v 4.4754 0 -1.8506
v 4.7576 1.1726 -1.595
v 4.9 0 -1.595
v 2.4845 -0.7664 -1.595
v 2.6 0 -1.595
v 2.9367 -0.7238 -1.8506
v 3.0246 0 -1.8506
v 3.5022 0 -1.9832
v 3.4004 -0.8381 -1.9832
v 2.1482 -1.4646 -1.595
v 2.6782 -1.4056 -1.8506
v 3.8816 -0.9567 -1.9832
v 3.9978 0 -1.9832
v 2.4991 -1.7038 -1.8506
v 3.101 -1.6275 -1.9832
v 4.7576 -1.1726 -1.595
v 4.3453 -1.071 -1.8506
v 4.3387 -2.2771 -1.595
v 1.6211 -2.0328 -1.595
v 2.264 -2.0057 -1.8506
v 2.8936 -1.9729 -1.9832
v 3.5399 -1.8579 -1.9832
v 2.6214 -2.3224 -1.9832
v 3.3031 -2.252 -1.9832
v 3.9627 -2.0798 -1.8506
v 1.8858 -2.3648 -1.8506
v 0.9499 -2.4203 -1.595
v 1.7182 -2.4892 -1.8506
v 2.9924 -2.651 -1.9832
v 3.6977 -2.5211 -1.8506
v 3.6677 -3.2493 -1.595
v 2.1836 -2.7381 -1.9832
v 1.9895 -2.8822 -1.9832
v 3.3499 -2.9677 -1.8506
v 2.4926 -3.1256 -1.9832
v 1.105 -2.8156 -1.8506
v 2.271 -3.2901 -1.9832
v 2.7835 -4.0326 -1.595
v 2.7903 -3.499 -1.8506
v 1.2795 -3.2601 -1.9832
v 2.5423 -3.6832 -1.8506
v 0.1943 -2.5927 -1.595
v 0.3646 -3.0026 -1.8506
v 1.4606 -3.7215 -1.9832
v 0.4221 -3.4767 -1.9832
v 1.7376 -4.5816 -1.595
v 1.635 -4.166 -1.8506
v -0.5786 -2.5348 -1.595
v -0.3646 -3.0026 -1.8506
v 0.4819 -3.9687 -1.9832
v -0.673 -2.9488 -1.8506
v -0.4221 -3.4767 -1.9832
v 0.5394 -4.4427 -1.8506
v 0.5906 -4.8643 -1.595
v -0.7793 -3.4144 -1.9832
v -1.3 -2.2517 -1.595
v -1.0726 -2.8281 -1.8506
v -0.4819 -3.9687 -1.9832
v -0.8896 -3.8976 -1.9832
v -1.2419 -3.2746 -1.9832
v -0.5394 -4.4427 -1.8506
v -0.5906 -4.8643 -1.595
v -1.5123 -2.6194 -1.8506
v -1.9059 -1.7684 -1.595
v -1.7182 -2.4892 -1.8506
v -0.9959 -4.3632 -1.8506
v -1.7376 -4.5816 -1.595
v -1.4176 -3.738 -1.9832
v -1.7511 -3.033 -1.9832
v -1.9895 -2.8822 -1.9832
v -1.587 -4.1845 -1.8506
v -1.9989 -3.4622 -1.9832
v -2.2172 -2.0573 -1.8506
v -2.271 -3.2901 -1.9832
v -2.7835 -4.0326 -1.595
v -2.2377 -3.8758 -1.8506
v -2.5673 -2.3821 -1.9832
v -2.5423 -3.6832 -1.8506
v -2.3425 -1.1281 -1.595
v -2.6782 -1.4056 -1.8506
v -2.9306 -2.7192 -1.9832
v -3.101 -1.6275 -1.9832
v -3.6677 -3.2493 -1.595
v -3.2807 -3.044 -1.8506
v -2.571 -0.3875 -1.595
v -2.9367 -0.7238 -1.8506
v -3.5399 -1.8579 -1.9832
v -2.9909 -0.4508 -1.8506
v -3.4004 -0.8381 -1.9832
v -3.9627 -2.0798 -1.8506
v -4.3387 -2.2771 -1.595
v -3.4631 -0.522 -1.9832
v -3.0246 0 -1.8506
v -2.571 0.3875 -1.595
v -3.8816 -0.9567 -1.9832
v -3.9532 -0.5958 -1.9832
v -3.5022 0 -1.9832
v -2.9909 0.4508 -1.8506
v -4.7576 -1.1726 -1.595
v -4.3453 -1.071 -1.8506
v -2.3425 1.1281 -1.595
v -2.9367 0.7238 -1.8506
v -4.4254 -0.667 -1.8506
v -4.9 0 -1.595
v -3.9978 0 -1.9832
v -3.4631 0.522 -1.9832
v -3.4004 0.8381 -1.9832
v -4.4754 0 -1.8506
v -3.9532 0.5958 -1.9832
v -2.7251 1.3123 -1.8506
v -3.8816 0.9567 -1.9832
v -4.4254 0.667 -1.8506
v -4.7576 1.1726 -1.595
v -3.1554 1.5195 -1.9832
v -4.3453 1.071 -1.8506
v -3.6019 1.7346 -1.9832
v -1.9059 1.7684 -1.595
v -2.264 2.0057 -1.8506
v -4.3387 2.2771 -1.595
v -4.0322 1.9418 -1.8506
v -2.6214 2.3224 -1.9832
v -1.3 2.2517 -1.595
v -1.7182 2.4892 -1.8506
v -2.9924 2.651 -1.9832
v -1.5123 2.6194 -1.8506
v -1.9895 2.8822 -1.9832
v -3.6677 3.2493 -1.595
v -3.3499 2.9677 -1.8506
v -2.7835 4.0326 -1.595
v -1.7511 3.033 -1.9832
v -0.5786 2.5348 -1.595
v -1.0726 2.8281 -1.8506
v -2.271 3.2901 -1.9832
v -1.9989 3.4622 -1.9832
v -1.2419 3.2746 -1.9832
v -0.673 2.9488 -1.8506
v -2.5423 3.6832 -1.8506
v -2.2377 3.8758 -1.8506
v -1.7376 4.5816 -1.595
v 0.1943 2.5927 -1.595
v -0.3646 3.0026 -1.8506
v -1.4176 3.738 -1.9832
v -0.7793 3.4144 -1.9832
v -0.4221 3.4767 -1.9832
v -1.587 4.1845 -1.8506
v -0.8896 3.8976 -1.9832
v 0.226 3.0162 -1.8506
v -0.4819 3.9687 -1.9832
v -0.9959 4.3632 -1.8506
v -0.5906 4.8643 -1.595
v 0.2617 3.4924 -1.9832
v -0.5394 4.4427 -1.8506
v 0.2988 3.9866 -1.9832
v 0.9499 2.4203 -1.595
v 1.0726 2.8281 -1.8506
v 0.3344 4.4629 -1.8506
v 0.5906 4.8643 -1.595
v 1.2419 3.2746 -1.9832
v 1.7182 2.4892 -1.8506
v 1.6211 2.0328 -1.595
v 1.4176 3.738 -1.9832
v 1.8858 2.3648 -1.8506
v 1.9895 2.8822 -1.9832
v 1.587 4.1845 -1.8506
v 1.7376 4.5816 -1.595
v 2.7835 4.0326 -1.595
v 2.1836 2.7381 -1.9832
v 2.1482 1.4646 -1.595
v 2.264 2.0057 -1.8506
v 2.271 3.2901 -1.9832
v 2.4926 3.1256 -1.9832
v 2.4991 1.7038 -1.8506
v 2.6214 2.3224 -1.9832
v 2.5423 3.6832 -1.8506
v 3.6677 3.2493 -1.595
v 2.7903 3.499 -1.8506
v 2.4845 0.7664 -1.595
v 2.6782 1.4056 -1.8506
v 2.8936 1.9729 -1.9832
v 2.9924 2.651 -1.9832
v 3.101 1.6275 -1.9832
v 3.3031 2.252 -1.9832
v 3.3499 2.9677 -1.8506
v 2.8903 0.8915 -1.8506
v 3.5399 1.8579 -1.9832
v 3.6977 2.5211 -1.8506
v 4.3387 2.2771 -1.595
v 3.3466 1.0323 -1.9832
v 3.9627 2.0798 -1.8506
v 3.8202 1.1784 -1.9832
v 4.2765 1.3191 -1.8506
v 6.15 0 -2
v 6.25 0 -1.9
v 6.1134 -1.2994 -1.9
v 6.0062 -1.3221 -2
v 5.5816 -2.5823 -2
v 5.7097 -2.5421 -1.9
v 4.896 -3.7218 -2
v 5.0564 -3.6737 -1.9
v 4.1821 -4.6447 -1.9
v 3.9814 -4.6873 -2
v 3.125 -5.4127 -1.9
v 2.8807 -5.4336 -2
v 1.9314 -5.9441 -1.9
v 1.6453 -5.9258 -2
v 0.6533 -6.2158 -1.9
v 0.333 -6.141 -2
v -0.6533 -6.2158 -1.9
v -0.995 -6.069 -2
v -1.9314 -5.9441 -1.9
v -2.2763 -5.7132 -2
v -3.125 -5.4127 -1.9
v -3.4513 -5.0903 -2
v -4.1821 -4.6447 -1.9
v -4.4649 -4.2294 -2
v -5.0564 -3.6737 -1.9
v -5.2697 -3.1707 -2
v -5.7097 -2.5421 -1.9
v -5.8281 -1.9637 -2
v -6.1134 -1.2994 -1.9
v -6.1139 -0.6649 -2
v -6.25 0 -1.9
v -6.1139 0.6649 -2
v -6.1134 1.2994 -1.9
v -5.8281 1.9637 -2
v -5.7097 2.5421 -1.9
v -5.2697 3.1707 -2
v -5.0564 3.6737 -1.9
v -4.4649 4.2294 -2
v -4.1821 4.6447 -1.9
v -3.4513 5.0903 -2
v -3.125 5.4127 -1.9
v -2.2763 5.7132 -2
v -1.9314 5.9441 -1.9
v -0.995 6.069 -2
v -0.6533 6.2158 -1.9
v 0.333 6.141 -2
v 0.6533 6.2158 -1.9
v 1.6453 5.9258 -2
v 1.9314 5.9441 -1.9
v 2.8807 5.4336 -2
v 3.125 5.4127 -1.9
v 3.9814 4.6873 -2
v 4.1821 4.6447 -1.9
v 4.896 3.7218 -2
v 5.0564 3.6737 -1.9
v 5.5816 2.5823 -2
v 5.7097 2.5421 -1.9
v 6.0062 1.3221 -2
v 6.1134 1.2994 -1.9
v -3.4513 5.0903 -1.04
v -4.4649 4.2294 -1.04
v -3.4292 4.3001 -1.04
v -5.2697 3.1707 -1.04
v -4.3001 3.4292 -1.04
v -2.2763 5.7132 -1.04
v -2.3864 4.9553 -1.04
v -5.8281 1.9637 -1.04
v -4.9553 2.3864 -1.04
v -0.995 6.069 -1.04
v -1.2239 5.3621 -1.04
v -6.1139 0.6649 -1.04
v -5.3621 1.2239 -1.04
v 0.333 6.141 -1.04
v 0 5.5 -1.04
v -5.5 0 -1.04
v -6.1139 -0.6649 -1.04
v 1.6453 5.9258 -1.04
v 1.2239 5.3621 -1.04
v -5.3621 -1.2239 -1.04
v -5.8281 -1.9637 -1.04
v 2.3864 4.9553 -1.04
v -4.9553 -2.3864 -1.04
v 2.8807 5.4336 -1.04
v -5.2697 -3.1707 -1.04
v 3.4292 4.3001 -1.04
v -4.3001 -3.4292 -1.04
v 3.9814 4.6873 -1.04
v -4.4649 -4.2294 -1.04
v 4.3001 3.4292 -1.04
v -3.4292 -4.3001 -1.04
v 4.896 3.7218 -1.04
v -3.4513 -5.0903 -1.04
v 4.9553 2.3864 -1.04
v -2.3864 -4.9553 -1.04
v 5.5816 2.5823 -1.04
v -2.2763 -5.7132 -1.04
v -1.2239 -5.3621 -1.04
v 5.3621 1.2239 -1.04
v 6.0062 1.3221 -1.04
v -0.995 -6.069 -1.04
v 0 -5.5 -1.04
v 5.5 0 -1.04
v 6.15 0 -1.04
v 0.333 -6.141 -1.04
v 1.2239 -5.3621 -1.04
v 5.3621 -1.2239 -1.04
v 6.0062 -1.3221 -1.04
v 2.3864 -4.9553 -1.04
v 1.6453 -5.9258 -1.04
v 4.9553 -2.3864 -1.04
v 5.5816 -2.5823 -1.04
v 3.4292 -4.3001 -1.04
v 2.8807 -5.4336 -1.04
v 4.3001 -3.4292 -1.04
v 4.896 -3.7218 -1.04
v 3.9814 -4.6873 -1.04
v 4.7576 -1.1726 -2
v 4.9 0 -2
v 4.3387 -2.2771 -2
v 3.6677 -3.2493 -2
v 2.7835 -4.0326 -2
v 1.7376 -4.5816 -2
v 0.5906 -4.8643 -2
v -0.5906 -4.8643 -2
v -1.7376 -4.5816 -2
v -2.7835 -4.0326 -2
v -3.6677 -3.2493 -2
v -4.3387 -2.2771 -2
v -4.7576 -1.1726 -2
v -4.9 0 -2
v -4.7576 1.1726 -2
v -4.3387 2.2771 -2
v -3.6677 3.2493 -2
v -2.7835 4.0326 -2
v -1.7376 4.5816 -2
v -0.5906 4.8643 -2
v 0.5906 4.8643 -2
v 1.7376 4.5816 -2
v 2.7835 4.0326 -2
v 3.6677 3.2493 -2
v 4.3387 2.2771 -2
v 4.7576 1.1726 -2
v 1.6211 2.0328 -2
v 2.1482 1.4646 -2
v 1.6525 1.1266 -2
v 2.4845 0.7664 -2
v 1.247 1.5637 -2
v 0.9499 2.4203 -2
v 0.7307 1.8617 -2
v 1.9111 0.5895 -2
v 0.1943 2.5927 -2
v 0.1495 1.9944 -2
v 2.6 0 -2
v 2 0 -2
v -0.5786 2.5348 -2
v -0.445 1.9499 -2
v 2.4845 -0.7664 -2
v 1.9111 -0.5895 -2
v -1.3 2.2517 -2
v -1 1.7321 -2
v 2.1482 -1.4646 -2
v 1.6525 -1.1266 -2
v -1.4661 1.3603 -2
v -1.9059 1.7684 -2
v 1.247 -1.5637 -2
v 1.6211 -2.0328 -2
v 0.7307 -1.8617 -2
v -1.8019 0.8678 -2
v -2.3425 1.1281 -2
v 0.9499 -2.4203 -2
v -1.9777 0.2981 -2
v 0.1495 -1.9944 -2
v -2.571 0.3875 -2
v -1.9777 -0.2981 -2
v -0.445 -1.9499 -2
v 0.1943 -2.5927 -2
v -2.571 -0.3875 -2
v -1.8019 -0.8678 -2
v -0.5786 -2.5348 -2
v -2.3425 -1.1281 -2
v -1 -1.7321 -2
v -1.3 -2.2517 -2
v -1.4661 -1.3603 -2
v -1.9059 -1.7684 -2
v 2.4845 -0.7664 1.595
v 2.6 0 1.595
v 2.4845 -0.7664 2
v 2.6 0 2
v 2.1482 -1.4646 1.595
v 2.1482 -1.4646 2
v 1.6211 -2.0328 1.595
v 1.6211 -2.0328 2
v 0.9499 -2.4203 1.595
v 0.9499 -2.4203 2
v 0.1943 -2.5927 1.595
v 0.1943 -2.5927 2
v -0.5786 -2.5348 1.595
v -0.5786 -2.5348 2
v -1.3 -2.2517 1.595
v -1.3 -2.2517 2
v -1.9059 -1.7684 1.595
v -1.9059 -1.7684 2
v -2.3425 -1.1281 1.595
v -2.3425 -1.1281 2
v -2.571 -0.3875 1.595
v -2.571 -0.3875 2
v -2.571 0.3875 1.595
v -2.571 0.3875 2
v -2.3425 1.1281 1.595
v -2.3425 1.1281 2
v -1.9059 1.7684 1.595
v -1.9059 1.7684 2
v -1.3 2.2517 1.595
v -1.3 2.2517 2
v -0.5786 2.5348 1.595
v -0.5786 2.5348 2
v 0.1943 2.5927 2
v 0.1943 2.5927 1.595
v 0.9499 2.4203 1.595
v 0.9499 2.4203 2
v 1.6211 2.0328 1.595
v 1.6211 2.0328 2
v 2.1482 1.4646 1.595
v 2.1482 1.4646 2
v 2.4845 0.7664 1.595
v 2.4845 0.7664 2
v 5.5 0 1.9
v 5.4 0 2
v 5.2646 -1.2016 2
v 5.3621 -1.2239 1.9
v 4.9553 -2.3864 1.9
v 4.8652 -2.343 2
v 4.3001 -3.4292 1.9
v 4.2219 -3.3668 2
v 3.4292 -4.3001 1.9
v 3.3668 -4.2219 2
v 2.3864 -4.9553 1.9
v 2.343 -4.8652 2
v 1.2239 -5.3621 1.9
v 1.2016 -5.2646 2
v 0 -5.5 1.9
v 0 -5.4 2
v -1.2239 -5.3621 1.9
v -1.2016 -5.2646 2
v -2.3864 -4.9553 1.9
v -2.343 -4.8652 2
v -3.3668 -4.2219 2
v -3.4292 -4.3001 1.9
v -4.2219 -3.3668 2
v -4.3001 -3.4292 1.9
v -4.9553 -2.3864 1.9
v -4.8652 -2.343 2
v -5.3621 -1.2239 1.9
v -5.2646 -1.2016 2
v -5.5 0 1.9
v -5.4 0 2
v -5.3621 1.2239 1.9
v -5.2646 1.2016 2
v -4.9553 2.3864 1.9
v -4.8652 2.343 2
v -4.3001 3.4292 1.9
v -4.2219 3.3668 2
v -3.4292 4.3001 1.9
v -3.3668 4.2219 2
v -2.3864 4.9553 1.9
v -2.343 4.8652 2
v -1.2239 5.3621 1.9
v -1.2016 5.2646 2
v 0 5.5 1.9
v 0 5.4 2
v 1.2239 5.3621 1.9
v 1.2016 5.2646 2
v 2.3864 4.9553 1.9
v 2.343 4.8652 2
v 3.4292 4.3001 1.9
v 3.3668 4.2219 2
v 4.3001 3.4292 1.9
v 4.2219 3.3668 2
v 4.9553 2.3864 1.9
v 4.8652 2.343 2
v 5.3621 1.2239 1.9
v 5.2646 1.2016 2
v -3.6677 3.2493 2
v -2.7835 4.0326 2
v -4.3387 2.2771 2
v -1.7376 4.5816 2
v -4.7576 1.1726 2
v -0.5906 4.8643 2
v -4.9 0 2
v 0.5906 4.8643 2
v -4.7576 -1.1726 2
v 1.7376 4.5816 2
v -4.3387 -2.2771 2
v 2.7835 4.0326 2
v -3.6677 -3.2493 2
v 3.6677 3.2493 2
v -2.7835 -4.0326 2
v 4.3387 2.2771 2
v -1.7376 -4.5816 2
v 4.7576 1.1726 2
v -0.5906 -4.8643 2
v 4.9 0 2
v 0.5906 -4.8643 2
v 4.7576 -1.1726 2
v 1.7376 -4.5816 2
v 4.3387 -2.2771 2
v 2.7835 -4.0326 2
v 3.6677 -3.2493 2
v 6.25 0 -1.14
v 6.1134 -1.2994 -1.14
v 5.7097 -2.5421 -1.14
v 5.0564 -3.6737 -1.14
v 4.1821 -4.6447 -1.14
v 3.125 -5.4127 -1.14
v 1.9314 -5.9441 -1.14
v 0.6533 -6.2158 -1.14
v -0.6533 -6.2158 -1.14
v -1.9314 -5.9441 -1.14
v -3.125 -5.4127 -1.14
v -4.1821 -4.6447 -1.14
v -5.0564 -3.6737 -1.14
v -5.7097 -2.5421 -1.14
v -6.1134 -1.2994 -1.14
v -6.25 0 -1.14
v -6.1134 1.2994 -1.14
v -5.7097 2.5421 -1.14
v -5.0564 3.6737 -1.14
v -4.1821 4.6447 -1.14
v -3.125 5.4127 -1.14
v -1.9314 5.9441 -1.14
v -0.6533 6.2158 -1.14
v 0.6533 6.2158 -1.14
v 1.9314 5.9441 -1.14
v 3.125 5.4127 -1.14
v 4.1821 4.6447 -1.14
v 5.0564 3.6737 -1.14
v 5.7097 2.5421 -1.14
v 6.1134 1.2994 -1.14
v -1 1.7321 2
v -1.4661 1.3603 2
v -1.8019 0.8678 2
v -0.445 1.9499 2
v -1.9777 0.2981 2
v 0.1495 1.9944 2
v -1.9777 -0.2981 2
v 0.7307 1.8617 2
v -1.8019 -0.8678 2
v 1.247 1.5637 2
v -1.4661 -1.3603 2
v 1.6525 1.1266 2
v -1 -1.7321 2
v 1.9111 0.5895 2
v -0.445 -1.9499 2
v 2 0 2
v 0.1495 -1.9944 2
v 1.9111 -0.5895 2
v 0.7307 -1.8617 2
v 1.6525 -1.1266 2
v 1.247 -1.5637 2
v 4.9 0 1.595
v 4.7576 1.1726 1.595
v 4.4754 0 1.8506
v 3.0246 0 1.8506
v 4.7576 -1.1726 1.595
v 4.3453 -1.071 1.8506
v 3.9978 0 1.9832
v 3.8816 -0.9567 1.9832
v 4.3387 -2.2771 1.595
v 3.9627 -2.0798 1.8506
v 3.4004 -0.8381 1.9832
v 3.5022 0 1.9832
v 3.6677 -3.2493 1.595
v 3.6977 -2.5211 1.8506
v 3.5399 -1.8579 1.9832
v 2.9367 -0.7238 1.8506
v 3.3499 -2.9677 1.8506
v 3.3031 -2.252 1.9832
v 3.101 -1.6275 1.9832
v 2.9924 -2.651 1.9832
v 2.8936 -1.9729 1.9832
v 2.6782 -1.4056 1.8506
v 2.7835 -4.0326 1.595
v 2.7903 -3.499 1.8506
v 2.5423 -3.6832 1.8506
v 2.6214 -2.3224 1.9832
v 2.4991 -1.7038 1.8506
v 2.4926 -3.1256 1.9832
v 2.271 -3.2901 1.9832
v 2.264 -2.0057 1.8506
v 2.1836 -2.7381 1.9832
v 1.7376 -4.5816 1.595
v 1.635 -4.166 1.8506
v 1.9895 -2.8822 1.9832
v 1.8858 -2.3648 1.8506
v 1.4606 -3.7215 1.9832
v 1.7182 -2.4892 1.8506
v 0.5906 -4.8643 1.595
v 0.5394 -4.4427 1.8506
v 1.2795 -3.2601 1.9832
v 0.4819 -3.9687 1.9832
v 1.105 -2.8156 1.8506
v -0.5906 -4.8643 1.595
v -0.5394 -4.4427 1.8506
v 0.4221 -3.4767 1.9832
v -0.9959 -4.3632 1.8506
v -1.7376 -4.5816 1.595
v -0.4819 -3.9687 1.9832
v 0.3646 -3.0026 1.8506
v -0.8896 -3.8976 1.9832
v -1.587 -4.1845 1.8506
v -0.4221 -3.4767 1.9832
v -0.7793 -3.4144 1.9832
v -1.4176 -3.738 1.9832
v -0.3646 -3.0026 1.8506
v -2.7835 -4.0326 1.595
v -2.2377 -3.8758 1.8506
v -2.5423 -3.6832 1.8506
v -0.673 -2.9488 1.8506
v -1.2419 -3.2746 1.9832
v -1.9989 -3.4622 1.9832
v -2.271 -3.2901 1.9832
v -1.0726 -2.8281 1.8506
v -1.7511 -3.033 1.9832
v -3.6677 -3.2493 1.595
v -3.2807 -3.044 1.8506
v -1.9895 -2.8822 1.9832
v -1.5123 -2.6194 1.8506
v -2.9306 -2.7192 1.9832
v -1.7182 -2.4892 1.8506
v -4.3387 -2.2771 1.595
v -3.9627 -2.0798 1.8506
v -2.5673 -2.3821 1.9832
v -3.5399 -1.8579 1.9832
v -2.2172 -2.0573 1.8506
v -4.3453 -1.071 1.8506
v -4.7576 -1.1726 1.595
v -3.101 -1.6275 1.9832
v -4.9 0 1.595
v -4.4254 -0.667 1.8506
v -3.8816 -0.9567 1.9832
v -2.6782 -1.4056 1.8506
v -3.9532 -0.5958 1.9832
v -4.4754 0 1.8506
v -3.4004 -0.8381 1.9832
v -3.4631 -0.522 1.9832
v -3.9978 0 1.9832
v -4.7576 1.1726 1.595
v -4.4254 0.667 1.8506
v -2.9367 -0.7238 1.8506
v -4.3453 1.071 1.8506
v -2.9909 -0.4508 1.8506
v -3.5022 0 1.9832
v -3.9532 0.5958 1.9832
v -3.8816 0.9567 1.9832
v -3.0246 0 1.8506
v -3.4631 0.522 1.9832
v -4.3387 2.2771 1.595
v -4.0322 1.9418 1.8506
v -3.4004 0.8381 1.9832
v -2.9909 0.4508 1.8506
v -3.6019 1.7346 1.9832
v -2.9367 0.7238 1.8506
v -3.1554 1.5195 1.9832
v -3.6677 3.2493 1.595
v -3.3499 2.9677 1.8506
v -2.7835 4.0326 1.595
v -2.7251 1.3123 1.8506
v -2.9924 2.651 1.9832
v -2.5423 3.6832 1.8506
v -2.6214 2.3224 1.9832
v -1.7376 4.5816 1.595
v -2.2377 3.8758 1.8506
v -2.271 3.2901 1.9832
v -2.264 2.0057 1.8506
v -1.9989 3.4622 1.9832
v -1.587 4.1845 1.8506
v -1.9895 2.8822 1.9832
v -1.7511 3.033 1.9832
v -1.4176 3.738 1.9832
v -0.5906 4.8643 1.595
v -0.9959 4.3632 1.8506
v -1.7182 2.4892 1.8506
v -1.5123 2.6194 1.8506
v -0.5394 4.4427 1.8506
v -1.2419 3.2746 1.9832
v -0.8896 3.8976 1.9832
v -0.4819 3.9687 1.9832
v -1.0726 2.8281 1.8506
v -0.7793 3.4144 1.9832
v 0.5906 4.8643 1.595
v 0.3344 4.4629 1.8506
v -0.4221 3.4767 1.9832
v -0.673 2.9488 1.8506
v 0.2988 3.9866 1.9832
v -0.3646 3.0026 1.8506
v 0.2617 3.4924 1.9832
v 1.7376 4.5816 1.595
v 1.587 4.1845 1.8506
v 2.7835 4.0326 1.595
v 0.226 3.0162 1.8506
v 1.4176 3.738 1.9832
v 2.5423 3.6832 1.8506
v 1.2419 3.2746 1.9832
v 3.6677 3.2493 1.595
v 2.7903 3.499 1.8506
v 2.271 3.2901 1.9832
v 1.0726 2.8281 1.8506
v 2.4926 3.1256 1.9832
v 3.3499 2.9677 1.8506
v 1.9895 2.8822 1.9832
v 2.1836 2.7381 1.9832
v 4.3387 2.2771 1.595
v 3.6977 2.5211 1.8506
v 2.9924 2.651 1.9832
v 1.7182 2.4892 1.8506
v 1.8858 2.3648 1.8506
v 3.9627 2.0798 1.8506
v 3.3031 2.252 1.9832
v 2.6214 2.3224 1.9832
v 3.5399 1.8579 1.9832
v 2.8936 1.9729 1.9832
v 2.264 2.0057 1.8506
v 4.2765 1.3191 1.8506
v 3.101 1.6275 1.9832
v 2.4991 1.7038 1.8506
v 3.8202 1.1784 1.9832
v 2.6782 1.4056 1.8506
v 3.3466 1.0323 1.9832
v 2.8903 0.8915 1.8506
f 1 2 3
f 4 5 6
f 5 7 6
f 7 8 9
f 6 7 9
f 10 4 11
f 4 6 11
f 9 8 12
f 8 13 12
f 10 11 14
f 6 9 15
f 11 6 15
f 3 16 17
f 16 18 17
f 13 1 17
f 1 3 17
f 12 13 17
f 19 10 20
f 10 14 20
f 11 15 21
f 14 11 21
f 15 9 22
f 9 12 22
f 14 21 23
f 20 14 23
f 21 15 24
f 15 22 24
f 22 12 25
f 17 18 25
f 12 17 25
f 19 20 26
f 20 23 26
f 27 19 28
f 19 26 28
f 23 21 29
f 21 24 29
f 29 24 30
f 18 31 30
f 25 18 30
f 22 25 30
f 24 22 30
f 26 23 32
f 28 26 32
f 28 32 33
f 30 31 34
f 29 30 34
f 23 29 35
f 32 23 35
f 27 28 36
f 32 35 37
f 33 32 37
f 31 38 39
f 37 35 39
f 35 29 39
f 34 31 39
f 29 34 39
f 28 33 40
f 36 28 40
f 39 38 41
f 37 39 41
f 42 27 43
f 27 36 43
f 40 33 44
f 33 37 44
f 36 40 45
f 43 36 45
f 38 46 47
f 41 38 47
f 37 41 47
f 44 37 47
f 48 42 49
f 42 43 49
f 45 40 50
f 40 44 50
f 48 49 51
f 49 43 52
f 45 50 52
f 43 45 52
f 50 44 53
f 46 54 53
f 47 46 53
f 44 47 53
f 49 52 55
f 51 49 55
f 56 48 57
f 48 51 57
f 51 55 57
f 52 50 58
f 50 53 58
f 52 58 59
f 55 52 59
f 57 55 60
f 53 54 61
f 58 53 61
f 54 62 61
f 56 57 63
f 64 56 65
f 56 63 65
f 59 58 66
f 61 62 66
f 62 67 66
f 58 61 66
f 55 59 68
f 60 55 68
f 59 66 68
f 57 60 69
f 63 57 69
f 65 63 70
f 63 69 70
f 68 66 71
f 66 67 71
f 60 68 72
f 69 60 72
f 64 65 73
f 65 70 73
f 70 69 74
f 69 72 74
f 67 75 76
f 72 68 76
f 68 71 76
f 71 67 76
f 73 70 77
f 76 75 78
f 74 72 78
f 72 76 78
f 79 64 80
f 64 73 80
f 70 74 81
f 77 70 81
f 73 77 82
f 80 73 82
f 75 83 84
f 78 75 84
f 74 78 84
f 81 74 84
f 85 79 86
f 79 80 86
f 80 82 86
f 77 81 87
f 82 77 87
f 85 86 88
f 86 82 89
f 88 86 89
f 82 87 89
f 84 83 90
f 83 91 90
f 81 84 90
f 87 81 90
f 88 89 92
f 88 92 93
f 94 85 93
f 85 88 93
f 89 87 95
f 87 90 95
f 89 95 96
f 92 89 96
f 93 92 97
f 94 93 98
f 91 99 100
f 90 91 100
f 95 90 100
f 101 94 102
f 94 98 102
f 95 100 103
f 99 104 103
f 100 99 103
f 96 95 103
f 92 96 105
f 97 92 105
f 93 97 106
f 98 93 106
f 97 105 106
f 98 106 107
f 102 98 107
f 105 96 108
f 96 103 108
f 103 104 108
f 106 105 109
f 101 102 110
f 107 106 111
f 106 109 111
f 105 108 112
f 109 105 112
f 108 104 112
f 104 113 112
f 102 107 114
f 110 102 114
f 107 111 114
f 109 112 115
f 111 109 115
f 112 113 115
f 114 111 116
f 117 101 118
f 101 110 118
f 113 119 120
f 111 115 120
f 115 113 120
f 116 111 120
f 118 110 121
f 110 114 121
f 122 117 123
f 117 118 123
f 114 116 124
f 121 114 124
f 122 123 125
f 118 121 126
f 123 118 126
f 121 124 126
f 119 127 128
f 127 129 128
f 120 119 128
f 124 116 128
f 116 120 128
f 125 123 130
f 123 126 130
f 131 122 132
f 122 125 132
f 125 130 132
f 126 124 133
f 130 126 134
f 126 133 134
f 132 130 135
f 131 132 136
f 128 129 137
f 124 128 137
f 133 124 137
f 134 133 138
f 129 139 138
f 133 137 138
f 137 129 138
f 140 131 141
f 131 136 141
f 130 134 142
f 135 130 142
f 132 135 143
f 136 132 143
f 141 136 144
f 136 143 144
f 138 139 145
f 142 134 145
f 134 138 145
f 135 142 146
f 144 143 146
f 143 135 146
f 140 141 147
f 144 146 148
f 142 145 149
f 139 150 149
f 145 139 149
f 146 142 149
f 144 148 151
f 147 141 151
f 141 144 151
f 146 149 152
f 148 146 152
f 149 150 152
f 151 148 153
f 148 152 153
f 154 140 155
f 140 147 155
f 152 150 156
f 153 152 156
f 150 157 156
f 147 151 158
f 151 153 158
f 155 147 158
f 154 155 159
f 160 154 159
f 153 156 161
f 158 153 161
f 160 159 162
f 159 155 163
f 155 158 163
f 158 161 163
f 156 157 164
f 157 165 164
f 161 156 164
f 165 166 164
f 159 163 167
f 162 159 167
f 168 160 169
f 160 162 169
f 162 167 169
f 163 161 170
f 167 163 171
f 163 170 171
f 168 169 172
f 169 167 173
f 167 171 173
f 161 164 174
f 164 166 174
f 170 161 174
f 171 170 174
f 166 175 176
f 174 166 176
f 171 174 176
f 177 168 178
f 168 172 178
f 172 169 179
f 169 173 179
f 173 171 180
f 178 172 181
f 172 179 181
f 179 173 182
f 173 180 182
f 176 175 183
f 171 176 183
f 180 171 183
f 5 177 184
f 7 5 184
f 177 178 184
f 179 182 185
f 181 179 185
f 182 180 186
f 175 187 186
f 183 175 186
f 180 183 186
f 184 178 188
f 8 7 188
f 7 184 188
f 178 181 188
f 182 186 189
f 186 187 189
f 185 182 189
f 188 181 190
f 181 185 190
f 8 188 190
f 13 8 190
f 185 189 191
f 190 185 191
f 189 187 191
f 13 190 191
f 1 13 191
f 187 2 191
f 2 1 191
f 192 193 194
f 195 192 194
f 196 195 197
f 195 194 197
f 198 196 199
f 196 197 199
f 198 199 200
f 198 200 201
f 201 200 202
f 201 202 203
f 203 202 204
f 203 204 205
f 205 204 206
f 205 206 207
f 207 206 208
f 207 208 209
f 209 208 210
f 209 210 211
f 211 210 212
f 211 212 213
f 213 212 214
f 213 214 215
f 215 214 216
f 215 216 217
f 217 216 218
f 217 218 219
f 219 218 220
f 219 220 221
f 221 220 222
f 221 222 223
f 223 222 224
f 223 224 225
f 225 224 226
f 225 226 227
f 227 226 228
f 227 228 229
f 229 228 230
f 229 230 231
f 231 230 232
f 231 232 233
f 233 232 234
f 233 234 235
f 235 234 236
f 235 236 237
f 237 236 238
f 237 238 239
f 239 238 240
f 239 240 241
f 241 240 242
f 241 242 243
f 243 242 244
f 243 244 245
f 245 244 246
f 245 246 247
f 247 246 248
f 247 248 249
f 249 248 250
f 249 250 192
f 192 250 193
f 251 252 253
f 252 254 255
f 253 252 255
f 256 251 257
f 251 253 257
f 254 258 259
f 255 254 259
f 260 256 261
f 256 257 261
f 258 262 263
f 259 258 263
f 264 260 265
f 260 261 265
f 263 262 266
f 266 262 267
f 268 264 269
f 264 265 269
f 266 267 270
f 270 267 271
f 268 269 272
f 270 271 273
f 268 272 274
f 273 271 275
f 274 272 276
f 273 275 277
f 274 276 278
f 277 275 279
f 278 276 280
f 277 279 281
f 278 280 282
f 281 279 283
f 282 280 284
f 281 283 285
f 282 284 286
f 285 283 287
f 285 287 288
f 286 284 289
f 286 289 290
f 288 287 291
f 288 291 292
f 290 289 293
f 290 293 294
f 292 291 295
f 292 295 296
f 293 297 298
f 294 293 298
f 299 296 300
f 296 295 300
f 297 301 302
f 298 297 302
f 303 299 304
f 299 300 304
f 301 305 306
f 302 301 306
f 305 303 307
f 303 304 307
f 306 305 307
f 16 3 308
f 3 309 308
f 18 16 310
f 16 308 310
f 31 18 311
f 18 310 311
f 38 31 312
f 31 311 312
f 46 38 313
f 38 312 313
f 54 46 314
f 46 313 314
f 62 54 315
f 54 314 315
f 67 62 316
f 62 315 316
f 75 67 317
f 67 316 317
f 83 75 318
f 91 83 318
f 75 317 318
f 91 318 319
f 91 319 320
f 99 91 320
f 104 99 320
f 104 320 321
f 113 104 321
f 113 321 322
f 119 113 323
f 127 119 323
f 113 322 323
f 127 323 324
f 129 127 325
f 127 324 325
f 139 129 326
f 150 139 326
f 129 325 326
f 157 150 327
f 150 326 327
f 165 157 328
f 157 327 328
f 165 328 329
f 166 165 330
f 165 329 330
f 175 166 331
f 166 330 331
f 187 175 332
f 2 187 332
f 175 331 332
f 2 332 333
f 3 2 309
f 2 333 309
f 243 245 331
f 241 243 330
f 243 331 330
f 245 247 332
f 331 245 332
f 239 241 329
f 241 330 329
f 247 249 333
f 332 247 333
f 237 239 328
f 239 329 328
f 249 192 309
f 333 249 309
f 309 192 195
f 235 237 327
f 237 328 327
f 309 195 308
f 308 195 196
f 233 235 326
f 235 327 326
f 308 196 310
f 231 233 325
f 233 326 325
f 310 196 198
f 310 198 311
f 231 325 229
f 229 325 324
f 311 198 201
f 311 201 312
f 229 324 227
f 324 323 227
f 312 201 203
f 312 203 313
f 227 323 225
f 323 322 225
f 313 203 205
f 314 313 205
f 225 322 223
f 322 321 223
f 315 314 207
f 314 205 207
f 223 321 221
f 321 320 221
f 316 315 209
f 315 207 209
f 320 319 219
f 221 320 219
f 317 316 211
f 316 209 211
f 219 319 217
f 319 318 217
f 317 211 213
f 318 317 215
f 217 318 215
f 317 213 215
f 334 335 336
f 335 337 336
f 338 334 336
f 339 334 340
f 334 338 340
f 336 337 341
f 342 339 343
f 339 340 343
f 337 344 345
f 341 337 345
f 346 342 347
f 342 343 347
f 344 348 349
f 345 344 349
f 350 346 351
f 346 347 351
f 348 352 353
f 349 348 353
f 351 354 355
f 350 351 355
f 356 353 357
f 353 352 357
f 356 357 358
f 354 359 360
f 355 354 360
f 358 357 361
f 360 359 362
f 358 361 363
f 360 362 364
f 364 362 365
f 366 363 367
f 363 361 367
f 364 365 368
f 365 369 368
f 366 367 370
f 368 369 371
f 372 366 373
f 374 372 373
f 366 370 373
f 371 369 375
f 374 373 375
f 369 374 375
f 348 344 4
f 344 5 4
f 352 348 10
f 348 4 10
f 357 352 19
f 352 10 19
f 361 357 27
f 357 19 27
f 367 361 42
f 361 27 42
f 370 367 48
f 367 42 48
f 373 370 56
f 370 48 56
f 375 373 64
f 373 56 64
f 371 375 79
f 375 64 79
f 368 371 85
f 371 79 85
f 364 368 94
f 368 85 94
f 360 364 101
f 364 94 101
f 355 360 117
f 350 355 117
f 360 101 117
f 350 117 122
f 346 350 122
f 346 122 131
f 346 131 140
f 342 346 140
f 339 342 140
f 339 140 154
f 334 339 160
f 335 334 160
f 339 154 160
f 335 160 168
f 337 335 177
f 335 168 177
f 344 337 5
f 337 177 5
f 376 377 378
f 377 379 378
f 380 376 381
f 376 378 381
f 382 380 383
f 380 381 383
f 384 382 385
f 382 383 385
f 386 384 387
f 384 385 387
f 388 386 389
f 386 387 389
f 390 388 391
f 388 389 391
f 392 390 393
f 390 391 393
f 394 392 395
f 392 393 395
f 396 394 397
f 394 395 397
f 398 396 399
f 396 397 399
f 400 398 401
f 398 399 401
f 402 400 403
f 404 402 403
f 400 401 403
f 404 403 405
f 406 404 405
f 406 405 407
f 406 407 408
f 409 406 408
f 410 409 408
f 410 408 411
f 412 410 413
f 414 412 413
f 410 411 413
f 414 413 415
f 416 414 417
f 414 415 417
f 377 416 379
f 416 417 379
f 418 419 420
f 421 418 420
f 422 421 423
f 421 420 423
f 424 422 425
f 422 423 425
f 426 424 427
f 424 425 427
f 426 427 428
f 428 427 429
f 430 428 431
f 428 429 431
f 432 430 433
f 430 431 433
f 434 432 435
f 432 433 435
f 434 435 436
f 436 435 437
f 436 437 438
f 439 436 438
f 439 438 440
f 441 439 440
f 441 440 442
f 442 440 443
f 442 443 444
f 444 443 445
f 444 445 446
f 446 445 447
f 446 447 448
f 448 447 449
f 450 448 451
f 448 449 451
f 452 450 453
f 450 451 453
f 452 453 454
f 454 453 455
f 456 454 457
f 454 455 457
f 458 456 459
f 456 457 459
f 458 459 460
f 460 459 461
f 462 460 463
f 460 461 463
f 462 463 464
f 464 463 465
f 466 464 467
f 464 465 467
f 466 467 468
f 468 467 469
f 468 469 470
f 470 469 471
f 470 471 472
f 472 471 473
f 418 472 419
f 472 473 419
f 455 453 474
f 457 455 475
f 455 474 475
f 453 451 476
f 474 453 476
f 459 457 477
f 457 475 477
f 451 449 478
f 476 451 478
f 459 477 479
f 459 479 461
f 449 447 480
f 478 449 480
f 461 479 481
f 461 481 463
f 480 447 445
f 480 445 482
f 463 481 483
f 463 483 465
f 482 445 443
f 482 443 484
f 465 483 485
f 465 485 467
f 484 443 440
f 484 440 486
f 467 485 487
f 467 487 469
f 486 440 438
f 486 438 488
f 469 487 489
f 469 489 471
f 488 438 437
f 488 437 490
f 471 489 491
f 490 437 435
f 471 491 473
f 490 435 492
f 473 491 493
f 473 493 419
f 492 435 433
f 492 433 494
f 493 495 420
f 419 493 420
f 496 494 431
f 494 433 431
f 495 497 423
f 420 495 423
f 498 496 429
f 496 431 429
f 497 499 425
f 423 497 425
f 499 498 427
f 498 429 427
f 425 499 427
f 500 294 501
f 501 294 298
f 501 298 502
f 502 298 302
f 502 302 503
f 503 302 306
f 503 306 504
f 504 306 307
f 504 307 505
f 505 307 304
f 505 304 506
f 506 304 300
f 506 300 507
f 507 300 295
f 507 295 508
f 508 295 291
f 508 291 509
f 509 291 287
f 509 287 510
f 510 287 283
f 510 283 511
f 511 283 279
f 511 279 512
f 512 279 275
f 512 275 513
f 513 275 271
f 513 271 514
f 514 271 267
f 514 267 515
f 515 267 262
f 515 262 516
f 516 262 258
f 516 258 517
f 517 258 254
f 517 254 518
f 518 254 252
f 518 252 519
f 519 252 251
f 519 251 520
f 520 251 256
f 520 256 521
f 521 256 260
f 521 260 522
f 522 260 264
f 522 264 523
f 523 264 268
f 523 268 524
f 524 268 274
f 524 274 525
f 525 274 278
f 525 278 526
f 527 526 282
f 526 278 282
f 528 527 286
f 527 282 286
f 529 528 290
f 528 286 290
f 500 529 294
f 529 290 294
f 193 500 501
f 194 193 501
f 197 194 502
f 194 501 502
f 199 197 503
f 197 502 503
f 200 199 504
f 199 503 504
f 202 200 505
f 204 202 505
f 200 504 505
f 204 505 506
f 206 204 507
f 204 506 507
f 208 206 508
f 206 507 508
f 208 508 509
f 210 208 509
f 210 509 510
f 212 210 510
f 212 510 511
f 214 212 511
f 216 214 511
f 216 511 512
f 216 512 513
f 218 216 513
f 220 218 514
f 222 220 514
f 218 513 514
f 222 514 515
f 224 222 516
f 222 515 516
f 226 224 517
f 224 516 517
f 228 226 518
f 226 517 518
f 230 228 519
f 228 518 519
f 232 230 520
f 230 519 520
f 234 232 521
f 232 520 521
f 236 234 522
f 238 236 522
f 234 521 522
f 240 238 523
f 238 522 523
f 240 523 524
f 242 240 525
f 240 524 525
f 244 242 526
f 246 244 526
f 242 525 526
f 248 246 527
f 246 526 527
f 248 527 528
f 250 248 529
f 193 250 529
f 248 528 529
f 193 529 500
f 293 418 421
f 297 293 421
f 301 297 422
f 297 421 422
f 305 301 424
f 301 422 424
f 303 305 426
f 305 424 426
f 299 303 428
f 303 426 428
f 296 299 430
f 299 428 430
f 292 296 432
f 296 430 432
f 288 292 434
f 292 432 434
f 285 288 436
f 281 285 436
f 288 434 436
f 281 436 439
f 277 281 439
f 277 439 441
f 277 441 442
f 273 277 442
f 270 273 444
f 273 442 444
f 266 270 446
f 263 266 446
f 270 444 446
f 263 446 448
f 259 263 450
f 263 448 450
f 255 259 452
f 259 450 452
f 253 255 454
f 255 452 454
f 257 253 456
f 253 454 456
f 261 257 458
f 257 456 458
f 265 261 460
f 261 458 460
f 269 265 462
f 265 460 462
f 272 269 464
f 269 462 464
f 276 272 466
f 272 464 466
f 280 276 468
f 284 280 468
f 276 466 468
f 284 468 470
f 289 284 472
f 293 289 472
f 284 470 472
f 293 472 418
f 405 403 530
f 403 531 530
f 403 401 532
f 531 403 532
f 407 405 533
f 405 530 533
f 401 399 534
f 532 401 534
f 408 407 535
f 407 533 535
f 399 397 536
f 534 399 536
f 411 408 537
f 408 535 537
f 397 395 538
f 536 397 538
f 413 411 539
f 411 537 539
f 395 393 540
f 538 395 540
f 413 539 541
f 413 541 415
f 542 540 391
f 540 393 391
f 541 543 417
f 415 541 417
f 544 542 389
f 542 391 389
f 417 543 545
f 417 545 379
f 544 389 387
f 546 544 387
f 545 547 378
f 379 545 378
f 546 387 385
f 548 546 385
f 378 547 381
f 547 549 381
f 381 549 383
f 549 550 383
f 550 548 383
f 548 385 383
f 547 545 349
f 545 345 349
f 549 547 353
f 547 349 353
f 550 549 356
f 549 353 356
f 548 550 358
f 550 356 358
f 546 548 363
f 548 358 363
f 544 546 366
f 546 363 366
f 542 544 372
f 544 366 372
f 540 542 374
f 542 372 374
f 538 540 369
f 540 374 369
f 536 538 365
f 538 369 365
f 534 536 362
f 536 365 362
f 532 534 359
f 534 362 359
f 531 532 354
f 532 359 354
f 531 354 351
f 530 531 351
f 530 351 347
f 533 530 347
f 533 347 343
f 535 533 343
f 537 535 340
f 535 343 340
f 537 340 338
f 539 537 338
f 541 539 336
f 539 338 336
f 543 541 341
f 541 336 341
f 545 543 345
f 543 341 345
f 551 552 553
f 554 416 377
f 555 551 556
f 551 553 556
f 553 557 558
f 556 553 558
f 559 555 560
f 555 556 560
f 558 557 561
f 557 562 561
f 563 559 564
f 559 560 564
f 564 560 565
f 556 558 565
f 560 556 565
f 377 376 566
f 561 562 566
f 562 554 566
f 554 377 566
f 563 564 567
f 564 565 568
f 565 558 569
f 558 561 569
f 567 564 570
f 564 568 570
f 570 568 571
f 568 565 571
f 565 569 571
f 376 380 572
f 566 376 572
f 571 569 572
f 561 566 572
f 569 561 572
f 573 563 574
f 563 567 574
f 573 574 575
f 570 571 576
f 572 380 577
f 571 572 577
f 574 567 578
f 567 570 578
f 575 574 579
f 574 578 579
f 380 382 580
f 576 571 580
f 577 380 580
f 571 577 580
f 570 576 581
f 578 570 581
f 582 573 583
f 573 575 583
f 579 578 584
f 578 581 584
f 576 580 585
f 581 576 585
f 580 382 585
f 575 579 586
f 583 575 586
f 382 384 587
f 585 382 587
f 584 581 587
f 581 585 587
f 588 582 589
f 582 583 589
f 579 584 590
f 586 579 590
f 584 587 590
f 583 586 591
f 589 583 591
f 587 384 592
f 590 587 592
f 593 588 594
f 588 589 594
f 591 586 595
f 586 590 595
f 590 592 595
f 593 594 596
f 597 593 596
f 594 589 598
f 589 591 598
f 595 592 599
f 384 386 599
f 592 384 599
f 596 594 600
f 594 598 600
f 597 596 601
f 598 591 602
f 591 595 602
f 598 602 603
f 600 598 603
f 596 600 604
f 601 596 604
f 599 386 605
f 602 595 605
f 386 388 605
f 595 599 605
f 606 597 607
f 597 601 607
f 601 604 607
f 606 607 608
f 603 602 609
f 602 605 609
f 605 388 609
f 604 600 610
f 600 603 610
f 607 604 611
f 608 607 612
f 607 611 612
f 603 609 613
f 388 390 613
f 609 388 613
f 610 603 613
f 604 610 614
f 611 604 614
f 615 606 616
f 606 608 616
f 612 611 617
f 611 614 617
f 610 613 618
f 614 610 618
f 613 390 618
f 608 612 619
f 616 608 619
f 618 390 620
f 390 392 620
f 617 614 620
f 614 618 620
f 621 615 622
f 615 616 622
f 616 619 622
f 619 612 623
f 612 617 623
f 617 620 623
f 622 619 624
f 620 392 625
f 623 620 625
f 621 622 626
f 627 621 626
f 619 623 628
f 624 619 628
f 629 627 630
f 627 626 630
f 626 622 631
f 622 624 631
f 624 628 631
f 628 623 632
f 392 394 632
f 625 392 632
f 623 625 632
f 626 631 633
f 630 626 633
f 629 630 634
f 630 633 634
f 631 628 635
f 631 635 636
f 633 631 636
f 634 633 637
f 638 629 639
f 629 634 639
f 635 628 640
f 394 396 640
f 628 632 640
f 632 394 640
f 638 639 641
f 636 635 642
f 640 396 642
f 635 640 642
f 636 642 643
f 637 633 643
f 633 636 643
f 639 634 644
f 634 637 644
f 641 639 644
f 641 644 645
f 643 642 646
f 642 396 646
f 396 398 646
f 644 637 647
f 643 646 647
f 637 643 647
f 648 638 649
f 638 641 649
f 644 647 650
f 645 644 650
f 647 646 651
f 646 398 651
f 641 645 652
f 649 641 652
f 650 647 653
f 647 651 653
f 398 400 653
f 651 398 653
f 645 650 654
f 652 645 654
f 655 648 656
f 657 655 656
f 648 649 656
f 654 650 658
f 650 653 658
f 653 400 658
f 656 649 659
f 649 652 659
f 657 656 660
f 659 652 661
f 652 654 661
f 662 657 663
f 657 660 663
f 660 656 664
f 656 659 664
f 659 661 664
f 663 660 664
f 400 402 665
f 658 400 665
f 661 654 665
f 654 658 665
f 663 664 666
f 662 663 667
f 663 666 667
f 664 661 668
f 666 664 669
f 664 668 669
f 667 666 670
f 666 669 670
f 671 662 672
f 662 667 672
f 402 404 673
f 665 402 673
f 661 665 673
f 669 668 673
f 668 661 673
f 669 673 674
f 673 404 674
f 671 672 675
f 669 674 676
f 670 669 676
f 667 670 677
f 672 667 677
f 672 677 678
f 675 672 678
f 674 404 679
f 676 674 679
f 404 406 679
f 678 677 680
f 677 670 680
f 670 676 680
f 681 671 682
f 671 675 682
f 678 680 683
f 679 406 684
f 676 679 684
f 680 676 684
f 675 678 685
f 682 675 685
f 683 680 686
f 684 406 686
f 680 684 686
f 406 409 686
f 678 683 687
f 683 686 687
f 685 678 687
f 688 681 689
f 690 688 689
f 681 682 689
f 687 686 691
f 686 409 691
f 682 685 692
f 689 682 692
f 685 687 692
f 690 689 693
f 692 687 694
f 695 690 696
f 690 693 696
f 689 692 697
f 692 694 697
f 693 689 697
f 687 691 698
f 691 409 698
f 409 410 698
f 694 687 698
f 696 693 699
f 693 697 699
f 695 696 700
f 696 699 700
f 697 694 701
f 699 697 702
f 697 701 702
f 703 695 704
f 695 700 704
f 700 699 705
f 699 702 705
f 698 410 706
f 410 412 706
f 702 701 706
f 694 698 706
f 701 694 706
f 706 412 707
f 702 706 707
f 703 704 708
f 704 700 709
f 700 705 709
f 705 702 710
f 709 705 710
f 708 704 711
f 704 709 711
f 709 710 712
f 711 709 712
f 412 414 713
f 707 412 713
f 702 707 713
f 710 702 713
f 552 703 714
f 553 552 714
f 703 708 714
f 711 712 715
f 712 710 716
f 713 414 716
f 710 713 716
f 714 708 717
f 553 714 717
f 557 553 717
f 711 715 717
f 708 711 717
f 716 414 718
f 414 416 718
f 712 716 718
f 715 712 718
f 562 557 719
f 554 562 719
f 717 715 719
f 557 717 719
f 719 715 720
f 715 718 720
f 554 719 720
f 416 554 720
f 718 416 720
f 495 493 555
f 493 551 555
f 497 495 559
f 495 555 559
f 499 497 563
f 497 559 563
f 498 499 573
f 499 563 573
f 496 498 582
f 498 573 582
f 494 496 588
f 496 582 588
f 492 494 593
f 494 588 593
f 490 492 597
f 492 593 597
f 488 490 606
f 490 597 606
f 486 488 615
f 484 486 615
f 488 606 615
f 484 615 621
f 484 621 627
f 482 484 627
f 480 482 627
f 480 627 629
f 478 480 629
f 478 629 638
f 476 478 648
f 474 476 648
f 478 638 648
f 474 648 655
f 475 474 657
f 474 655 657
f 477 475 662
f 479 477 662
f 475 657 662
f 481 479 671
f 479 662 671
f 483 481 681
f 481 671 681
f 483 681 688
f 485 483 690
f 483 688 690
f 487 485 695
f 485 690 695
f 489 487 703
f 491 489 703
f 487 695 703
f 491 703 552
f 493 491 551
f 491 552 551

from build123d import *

# Parameters (mm, degrees)
CHAMFER1_SIZE = 0.1


with BuildPart() as part:
    # Sketch1 → Revolve1 (revolve)
    with BuildSketch(Plane(origin=(0, 0, 0), x_dir=(0, 0, -1), z_dir=(1, 0, 0)), mode=Mode.PRIVATE) as revolve1_sk:
        with BuildLine():
            Line((-2, 2), (2, 2))
            Line((2, 2), (2, 2.6))
            Line((2, 2.6), (1.594951068, 2.6))
            ThreePointArc((1.594951068, 2.6), (2, 3.75), (1.594951068, 4.9))
            Line((1.594951068, 4.9), (2, 4.9))
            Line((2, 4.9), (2, 6.25))
            Line((2, 6.25), (1.04, 6.25))
            Line((1.04, 6.25), (1.04, 5.5))
            Line((1.04, 5.5), (-2, 5.5))
            Line((-2, 5.5), (-2, 4.9))
            Line((-2, 4.9), (-1.594951068, 4.9))
            ThreePointArc((-1.594951068, 4.9), (-2, 3.75), (-1.594951068, 2.6))
            Line((-1.594951068, 2.6), (-2, 2.6))
            Line((-2, 2.6), (-2, 2))
        make_face()
    revolve(revolve1_sk.sketch.rotate(Axis((0, 0, 0), (0, 0, -1)), 90), axis=Axis((0, 0, 0), (0, 0, -1)))

    # Chamfer1
    chamfer1_edges = [part.edges().sort_by_distance(p)[0] for p in [
        (-5.5, 0, 2),
        (-6.25, 0, -1.04),
        (-6.25, 0, -2),
    ]]
    chamfer(chamfer1_edges, length=CHAMFER1_SIZE)


solid = part.part
